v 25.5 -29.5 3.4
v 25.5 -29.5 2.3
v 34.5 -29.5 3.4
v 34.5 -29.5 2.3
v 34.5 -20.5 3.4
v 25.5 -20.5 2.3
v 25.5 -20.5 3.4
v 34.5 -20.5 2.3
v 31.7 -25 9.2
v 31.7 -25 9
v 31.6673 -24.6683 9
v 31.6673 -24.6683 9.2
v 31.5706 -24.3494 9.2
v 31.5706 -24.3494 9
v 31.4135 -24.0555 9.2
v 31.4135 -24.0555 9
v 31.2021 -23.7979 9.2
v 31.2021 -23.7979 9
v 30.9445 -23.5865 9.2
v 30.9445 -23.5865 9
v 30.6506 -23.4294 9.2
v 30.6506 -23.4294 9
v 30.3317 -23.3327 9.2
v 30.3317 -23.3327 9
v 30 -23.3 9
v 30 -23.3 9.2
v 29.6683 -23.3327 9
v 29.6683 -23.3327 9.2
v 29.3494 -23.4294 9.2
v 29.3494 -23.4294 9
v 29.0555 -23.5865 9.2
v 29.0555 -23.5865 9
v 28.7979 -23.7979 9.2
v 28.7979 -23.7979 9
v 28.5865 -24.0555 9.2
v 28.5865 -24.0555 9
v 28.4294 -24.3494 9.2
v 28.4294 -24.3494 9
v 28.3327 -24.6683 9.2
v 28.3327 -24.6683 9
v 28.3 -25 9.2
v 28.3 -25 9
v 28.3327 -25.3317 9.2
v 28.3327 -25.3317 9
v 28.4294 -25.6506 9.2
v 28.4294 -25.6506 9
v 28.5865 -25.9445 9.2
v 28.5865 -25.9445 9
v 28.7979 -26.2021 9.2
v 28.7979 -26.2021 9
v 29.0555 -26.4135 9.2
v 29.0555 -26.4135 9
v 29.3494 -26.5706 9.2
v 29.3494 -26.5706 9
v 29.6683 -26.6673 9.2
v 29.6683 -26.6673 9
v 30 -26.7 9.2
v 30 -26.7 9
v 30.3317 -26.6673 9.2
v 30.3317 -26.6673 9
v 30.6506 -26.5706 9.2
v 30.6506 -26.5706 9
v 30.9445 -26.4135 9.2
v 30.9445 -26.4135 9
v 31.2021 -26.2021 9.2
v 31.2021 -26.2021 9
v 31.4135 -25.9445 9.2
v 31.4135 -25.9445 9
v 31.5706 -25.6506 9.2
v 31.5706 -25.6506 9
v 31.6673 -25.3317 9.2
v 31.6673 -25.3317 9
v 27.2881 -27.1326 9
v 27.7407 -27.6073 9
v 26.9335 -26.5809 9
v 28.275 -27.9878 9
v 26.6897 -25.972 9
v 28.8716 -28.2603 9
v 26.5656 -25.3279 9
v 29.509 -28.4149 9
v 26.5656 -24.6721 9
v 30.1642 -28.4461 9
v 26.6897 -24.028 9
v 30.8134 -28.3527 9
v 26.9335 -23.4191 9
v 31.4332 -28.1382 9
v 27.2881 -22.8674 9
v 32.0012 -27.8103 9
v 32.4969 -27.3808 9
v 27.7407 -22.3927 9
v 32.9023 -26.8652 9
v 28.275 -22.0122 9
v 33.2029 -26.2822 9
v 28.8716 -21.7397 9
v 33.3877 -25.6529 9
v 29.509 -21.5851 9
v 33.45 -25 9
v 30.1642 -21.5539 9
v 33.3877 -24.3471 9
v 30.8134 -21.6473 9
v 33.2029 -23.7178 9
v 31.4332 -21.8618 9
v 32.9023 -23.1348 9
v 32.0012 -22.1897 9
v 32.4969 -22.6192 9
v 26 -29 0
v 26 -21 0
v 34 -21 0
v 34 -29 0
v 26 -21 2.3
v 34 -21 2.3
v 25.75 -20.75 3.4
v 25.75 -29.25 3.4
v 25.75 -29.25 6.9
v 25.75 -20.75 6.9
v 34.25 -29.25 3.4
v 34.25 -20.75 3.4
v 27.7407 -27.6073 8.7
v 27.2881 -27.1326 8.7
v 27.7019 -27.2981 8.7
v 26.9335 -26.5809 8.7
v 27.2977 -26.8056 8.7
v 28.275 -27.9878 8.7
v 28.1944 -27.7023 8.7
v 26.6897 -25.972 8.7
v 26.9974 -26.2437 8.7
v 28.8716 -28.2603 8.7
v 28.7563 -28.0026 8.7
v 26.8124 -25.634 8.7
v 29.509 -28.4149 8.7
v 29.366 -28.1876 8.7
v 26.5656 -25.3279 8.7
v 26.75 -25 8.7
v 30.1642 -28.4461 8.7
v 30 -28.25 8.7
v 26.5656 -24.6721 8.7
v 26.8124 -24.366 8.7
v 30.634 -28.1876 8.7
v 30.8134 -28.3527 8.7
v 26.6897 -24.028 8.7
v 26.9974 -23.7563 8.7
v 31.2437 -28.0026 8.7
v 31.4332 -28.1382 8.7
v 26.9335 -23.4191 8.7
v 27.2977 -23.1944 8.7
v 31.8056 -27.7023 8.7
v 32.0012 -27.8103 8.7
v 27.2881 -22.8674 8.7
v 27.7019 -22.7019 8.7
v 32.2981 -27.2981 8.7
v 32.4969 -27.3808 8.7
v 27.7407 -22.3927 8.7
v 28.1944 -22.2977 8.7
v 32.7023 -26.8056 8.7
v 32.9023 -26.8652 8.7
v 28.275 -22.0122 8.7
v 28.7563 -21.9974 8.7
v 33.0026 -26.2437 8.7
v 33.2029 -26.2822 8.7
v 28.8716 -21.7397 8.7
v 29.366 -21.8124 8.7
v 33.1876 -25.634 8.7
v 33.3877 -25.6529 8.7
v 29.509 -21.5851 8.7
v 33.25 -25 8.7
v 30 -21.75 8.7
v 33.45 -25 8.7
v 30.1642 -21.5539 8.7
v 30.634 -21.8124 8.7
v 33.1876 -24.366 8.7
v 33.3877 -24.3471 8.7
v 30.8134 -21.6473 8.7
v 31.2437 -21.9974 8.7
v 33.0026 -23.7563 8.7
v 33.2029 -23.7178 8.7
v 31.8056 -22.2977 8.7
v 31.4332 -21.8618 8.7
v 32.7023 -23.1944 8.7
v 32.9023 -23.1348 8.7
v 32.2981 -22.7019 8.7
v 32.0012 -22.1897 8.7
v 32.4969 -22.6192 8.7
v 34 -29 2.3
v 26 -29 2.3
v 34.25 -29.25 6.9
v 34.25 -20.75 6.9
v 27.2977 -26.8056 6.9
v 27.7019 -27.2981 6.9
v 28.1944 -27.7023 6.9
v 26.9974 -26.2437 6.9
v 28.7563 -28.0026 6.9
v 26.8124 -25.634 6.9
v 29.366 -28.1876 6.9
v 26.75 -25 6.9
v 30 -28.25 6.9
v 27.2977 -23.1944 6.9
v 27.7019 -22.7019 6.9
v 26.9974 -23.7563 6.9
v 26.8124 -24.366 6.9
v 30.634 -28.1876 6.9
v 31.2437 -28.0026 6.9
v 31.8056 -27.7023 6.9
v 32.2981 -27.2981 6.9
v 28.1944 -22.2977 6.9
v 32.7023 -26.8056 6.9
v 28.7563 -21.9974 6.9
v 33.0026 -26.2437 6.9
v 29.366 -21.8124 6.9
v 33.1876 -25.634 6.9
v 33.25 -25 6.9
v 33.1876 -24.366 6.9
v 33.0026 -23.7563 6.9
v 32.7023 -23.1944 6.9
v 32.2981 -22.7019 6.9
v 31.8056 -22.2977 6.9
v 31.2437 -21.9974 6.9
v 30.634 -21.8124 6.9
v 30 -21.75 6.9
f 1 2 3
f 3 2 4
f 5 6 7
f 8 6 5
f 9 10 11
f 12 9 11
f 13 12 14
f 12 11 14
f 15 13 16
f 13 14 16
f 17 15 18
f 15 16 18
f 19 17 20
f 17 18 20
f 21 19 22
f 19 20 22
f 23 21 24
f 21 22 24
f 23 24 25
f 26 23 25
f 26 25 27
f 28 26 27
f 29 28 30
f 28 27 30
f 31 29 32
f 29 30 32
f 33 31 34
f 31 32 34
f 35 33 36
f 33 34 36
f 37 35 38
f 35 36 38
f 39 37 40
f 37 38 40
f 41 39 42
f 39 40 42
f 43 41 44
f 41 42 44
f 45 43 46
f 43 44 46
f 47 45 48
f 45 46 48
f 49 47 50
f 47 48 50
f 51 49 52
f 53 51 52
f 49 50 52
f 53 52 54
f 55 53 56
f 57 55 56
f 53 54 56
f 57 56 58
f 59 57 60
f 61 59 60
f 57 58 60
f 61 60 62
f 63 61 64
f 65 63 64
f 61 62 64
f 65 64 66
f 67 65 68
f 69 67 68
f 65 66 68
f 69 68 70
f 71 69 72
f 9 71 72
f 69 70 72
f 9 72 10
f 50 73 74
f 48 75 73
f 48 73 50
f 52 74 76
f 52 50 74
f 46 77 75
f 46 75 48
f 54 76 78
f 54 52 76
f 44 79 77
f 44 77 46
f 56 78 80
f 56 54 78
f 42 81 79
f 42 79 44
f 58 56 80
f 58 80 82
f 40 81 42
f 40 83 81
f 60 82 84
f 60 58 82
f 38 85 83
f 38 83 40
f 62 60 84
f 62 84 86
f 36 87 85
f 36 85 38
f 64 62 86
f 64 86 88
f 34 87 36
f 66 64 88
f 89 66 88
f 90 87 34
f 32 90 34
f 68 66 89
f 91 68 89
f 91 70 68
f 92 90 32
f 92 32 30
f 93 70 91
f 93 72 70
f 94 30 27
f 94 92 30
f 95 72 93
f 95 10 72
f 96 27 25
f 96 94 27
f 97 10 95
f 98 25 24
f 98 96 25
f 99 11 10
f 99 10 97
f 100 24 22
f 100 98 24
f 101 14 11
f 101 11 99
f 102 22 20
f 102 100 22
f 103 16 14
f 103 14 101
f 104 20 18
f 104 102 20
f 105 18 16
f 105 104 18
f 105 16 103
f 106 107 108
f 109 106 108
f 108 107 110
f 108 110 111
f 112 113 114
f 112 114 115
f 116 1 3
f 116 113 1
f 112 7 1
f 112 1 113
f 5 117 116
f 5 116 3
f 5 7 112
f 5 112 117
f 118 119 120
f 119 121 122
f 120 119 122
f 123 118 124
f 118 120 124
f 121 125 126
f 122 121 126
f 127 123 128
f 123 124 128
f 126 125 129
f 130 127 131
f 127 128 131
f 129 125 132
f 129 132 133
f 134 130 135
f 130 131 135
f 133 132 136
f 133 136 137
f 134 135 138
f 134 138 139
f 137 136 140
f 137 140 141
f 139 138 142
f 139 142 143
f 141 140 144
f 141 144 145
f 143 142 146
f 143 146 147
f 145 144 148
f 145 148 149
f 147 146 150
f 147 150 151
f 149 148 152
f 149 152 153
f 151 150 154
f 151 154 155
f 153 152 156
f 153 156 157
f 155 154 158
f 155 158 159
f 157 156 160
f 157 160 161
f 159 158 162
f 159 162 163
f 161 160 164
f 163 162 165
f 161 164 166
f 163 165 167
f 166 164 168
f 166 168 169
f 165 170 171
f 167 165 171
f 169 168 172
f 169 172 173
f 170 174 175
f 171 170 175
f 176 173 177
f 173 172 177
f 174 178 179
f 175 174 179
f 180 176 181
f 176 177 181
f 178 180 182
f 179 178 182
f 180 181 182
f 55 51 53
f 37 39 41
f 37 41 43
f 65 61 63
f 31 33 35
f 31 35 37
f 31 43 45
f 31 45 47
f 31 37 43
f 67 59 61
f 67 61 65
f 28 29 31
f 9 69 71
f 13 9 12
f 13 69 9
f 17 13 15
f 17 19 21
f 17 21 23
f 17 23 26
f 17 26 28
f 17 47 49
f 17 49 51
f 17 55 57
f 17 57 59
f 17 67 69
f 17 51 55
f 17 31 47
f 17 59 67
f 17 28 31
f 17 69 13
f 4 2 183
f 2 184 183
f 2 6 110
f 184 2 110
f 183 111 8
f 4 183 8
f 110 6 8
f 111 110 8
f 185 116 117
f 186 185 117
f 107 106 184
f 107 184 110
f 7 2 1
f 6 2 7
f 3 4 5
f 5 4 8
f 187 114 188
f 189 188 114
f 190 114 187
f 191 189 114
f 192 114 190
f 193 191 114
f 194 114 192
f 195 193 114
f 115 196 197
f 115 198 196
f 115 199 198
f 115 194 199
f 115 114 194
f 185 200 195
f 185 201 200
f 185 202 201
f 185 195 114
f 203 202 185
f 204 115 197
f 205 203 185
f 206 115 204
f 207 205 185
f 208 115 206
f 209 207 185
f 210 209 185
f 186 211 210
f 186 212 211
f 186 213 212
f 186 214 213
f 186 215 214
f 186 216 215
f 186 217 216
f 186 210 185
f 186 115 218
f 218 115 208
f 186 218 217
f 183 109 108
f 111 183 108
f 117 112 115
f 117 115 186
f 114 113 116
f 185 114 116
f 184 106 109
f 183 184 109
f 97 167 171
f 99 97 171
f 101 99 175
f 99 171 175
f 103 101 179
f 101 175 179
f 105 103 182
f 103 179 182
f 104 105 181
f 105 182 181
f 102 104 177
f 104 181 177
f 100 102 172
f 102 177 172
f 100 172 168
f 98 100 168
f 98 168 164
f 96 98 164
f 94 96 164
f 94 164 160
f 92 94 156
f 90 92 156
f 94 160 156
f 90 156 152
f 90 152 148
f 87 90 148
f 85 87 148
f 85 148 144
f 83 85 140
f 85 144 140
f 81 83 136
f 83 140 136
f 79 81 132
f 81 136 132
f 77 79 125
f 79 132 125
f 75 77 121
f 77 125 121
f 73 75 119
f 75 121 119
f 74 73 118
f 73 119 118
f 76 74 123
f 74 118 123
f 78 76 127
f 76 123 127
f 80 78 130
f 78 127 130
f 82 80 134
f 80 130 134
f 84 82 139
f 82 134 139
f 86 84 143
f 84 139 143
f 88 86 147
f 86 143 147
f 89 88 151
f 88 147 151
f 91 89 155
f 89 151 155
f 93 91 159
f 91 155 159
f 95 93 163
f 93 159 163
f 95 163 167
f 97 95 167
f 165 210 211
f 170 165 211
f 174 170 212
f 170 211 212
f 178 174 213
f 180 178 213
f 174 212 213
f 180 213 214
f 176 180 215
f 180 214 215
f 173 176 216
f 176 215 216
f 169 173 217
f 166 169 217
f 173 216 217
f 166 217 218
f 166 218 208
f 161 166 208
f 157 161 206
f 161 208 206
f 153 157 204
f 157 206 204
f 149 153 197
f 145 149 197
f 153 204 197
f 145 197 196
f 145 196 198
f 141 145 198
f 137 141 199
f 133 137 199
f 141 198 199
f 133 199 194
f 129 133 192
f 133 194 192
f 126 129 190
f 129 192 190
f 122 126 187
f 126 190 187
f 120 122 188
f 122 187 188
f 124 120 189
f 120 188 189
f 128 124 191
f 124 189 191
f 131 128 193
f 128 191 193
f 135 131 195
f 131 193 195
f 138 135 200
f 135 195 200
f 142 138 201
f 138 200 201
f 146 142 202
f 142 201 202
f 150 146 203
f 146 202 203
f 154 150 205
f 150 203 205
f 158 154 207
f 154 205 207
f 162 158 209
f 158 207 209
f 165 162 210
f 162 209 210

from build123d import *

# Parameters (mm, degrees)
SKETCH_1_W        = 8
SKETCH_1_H        = 8
FOAM_PAD_DEPTH    = 2.3
SENSOR_START      = 2.3
SKETCH_2_W        = 9
SKETCH_2_H        = 9
SENSOR_PCB_DEPTH  = 1.1
LENS_START        = 3.4
SKETCH_3_W        = 8.5
SKETCH_3_H        = 8.5
LENS_HOLDER_DEPTH = 3.5
LENS_START_2      = 6.9
SKETCH_4_R        = 3.25
LENS_BARREL_DEPTH = 1.8
LENS_START_3      = 8.7
SKETCH_5_R        = 3.45
LENS_RING_DEPTH   = 0.3
LENS_START_4      = 9
SKETCH_6_R        = 1.7
LENS_GLASS_DEPTH  = 0.2


with BuildPart() as part:
    # 草圖1 → foam pad (new body)
    with BuildSketch(Plane.XY):
        with Locations((30, -25)):
            Rectangle(SKETCH_1_W, SKETCH_1_H)
    extrude(amount=FOAM_PAD_DEPTH)

    # 草圖2 → sensor PCB (add)
    with BuildSketch(Plane.XY.offset(SENSOR_START)):
        with Locations((30, -25)):
            Rectangle(SKETCH_2_W, SKETCH_2_H)
    extrude(amount=SENSOR_PCB_DEPTH)

    # 草圖3 → lens holder (add)
    with BuildSketch(Plane.XY.offset(LENS_START)):
        with Locations((30, -25)):
            Rectangle(SKETCH_3_W, SKETCH_3_H)
    extrude(amount=LENS_HOLDER_DEPTH)

    # 草圖4 → lens barrel (add)
    with BuildSketch(Plane.XY.offset(LENS_START_2)):
        with Locations((30, -25)):
            Circle(SKETCH_4_R)
    extrude(amount=LENS_BARREL_DEPTH)

    # 草圖5 → lens ring (add)
    with BuildSketch(Plane.XY.offset(LENS_START_3)):
        with Locations((30, -25)):
            Circle(SKETCH_5_R)
    extrude(amount=LENS_RING_DEPTH)

    # 草圖6 → lens glass (add)
    with BuildSketch(Plane.XY.offset(LENS_START_4)):
        with Locations((30, -25)):
            Circle(SKETCH_6_R)
    extrude(amount=LENS_GLASS_DEPTH)


solid = part.part
